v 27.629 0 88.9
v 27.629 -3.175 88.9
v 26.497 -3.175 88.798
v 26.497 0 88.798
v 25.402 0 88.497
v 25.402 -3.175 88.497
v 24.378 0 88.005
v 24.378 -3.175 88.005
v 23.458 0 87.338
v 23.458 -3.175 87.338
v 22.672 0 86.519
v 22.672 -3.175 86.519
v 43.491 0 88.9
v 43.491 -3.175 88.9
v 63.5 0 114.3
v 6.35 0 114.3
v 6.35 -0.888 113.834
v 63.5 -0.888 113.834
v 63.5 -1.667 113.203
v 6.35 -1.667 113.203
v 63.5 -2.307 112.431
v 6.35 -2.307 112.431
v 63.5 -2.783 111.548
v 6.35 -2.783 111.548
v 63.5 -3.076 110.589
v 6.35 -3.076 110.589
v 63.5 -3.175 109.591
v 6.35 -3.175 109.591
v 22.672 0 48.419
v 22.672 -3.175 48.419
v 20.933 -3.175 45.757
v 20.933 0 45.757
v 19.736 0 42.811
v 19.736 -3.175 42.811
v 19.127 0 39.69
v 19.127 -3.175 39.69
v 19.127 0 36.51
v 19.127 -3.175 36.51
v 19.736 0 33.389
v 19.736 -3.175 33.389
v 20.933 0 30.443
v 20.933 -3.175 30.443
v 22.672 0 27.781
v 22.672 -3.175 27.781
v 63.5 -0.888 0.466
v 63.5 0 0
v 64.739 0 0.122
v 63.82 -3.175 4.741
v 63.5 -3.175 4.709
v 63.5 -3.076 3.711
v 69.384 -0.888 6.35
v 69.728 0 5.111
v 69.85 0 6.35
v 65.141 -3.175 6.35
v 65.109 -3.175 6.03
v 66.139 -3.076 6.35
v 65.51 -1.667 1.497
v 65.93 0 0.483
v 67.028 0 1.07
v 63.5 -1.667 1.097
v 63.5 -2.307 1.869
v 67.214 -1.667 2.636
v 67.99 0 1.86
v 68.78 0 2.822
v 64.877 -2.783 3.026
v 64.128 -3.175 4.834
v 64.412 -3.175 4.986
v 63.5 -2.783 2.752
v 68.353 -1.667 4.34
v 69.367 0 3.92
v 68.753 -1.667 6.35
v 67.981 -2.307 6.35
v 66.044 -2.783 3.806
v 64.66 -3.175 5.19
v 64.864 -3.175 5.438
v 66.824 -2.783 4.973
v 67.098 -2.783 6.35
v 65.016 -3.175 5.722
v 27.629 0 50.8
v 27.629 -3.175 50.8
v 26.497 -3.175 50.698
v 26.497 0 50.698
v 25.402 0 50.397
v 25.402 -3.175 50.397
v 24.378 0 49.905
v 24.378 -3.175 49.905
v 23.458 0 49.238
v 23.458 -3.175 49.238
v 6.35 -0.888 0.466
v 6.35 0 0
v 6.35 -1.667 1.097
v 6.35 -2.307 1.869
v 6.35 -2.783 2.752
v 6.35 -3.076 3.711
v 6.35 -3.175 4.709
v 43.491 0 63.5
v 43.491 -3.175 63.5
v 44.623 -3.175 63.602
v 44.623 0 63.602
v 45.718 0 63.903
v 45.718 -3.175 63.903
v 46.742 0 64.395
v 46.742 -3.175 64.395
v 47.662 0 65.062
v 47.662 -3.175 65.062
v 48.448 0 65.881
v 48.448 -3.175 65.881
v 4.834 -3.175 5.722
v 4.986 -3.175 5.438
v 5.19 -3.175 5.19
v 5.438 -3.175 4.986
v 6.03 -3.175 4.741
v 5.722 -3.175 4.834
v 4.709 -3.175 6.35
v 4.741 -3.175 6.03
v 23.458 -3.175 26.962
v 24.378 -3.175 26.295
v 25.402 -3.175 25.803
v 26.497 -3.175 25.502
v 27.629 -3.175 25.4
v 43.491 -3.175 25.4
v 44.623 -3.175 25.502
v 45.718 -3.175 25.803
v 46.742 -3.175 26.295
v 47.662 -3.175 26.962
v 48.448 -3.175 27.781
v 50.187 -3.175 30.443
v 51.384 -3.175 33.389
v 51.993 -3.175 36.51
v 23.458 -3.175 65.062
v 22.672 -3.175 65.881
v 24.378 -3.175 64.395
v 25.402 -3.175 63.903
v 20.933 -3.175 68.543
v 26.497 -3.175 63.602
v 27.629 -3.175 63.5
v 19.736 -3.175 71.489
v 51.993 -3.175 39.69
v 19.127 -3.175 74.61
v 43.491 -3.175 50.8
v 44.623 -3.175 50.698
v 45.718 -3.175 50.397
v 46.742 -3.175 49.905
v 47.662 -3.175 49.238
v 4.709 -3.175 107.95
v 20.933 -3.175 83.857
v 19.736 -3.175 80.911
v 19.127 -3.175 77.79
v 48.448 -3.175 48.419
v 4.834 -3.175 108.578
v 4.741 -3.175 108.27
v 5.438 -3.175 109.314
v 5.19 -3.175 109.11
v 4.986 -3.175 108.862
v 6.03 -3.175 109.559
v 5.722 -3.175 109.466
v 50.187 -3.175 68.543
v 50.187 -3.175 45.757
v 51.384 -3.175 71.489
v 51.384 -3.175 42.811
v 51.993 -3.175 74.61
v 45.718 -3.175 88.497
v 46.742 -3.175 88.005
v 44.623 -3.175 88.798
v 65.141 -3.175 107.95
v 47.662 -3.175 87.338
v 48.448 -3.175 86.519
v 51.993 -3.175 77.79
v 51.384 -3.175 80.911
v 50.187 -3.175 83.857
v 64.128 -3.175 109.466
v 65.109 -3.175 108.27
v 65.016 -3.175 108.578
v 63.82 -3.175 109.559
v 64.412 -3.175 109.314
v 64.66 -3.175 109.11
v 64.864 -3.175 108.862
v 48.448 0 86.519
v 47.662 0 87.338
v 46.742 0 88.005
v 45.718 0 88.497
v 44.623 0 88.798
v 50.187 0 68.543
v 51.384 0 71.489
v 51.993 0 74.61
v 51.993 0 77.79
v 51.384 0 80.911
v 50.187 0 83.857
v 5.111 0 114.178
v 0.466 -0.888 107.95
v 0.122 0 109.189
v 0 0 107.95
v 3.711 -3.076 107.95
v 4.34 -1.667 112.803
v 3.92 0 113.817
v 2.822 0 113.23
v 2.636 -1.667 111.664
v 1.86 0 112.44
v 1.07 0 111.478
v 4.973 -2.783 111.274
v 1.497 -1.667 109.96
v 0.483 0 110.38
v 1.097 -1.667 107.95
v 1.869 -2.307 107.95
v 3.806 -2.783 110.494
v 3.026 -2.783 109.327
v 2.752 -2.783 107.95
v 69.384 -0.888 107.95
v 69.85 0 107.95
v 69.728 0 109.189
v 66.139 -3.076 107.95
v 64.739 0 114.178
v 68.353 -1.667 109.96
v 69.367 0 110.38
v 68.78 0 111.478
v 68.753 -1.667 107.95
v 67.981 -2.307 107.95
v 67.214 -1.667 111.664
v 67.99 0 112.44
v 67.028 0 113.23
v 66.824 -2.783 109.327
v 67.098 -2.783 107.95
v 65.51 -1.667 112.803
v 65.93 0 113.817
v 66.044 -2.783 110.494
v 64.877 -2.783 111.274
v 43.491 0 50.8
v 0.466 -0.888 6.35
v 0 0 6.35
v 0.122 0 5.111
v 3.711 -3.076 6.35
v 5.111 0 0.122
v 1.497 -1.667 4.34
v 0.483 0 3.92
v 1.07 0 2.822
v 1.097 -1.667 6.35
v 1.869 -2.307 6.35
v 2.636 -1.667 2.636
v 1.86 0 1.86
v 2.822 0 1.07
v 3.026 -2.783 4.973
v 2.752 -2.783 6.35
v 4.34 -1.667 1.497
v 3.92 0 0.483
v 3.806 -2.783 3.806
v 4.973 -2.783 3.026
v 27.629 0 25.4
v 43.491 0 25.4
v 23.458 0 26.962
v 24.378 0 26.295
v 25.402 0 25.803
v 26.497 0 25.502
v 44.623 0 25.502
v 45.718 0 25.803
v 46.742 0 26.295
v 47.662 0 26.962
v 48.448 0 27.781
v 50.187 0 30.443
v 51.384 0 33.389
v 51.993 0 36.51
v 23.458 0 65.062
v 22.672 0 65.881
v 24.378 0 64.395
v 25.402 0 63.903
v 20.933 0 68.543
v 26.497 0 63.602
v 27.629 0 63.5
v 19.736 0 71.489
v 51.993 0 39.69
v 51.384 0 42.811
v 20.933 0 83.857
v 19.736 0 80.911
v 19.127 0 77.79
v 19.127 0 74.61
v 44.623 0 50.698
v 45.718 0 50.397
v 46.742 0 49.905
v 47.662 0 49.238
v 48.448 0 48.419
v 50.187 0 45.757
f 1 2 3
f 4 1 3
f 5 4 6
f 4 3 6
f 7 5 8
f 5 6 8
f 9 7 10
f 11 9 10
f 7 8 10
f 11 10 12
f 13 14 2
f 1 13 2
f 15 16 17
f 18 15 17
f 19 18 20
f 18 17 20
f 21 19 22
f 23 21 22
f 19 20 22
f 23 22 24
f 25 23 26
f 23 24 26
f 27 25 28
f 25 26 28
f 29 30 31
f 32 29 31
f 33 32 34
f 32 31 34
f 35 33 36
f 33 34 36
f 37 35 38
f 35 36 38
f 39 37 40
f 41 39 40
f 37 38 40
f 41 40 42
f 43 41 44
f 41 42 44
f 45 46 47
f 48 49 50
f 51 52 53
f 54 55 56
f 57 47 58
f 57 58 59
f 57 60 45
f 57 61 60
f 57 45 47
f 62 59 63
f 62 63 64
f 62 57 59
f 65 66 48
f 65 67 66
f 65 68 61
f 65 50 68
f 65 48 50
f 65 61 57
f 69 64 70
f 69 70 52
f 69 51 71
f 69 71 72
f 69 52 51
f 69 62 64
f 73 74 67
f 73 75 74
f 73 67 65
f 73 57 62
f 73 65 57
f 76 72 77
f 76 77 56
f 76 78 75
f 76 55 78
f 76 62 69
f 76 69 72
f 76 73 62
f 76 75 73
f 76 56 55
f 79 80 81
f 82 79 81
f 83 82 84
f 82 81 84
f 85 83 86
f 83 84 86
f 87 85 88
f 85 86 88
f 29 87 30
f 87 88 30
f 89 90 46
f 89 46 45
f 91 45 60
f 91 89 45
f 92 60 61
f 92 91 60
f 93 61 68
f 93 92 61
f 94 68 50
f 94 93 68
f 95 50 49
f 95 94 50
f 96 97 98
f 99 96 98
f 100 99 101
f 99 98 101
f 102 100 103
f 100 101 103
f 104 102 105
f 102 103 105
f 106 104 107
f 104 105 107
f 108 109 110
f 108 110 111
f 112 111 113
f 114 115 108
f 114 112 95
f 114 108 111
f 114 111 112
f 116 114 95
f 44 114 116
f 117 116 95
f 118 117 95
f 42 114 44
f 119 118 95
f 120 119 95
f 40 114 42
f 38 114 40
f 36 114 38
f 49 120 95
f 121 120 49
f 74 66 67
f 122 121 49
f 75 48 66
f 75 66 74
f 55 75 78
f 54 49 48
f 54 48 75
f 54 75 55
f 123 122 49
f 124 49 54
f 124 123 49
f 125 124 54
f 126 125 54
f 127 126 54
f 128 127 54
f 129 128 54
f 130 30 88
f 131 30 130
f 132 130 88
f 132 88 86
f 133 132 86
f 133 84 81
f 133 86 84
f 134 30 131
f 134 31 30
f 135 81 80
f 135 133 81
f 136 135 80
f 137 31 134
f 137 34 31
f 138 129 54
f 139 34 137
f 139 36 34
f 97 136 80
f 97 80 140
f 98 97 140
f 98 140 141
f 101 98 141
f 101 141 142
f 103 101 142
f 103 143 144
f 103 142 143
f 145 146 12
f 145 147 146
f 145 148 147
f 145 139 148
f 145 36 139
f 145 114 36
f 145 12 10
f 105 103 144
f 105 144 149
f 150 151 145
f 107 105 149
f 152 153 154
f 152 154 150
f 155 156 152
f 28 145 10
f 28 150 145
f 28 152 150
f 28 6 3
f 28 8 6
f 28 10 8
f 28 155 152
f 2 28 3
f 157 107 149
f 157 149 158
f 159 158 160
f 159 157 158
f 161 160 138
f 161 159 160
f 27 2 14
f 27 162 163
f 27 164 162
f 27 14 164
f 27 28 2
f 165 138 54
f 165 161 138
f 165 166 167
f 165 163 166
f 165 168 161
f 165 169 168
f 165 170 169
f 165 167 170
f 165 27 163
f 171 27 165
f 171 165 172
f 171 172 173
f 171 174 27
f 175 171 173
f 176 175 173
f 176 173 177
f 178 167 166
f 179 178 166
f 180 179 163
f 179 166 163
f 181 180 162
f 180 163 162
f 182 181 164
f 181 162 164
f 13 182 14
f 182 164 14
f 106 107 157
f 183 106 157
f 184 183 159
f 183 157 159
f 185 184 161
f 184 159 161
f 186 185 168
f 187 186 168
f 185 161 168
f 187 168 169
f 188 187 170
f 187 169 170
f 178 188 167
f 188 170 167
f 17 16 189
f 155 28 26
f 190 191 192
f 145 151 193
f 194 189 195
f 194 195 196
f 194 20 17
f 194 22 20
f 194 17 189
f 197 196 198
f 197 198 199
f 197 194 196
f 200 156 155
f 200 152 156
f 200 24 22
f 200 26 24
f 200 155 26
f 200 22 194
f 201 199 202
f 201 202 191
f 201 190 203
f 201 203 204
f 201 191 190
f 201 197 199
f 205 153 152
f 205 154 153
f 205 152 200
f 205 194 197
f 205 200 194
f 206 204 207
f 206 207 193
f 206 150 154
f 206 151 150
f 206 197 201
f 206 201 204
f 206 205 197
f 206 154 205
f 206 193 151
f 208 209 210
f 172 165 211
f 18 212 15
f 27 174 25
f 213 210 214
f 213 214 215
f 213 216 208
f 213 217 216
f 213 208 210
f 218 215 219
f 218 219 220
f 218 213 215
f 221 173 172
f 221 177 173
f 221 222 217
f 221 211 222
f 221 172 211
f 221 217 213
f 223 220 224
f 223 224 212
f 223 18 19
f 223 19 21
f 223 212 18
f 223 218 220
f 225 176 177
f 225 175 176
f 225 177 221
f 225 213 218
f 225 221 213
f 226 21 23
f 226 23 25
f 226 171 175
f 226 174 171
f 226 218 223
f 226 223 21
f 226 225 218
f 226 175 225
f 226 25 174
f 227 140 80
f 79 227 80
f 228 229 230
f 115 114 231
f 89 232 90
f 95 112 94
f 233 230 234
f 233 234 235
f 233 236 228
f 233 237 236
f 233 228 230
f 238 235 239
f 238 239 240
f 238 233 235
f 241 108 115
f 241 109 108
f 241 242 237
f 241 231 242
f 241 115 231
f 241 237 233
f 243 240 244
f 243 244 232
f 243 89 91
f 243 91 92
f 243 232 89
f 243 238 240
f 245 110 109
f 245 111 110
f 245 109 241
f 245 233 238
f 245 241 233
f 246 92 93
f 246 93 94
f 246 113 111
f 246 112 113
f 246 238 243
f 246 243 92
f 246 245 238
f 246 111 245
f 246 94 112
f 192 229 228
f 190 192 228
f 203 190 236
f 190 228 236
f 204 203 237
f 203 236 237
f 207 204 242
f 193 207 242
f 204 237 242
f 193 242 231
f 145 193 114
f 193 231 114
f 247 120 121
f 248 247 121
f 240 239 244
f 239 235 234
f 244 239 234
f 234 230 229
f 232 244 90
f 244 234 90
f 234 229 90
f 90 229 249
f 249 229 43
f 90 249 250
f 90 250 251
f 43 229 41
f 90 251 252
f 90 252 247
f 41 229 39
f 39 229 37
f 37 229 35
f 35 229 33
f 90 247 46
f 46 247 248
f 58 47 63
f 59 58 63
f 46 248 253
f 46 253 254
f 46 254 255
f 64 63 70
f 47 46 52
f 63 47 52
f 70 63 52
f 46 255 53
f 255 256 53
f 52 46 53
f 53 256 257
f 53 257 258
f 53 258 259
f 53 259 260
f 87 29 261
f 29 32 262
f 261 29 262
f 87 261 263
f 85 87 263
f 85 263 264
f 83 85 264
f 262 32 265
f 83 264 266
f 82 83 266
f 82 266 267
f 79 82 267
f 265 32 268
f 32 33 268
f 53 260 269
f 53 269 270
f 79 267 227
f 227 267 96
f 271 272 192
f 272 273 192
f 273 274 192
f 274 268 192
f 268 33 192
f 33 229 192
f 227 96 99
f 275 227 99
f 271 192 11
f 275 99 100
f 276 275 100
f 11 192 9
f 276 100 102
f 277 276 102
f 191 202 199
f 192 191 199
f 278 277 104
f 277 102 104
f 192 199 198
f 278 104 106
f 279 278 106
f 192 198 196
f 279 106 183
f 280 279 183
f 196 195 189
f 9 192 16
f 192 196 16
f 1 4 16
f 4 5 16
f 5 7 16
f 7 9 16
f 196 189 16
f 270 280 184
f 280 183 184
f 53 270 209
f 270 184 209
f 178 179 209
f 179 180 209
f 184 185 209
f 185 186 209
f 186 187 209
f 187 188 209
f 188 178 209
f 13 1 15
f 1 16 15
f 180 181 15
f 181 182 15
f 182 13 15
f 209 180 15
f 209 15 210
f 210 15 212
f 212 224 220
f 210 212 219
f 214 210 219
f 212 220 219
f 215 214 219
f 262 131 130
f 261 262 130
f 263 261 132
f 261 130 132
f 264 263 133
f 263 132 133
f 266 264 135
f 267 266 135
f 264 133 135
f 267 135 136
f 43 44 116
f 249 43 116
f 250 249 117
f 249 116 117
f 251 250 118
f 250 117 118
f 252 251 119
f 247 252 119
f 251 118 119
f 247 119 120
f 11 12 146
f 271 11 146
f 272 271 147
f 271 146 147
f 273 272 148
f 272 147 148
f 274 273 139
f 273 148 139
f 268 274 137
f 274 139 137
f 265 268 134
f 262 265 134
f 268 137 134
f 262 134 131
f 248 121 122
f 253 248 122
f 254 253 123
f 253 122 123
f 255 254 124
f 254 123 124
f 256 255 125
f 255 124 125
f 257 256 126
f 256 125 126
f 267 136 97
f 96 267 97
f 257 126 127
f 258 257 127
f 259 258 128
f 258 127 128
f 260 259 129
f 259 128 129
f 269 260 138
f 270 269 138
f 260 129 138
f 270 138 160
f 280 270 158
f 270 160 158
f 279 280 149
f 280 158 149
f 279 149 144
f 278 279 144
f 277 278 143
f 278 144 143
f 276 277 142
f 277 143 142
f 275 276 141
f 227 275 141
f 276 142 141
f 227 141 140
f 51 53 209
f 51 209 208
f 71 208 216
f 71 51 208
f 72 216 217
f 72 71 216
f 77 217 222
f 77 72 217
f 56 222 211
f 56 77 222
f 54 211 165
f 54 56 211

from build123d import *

# Parameters (mm, degrees)
F1_DEPTH     = 3.175
F2_T1_DEPTH  = 57.15
F2_T3_DEPTH  = 101.6
F2_T6_ANGLE  = 90
F2_T8_ANGLE  = 90
F2_T10_ANGLE = 90
F2_T12_ANGLE = 90
F4_DEPTH     = 25.4


# Not quite as in the source:
# - a fillet or chamfer that OpenCascade refuses, or shapes differently, is made with other operations: its cross-section is extruded or revolved along the edge and cut away or added


with BuildPart() as f1:
    # F0 (on Front) → F1 (new body)
    with BuildSketch(Plane.XZ):
        with BuildLine():
            ThreePointArc((0, 6.35), (1.8598719395, 1.8598719395), (6.35, 0))
            Line((6.35, 0), (63.5, 0))
            ThreePointArc((63.5, 0), (67.9901280605, 1.8598719395), (69.85, 6.35))
            Line((69.85, 6.35), (69.85, 107.95))
            ThreePointArc((69.85, 107.95), (67.9901280605, 112.4401280605), (63.5, 114.3))
            Line((63.5, 114.3), (6.35, 114.3))
            ThreePointArc((6.35, 114.3), (1.8598719395, 112.4401280605), (0, 107.95))
            Line((0, 107.95), (0, 6.35))
        make_face()
    extrude(amount=F1_DEPTH)

    # F2: fillet of radius 5.08 on 1 edges, made by hand

    # F2_s2 → F2_t1 (cut)
    with BuildSketch(Plane.YZ.offset(6.35)):
        with BuildLine():
            ThreePointArc((0, 114.3), (-2.3071134838, 112.4305202921), (-3.175, 109.5907139607))
            Line((-3.175, 109.5907139607), (-3.175, 114.3))
            Line((-3.175, 114.3), (0, 114.3))
        make_face()
        with BuildLine():
            ThreePointArc((0, 0), (-2.3071134838, 1.8694797079), (-3.175, 4.7092860393))
            Line((-3.175, 4.7092860393), (-3.175, 0))
            Line((-3.175, 0), (0, 0))
        make_face()
    extrude(amount=F2_T1_DEPTH, mode=Mode.SUBTRACT)

    # F2_s4 → F2_t3 (cut)
    with BuildSketch(Plane.XY.offset(6.35)):
        with BuildLine():
            ThreePointArc((0, 0), (1.8694797079, -2.3071134838), (4.7092860393, -3.175))
            Line((4.7092860393, -3.175), (0, -3.175))
            Line((0, -3.175), (0, 0))
        make_face()
        with BuildLine():
            ThreePointArc((69.85, 0), (67.9805202921, -2.3071134838), (65.1407139607, -3.175))
            Line((65.1407139607, -3.175), (69.85, -3.175))
            Line((69.85, -3.175), (69.85, 0))
        make_face()
    extrude(amount=F2_T3_DEPTH, mode=Mode.SUBTRACT)

    # F2_s5 → F2_t6 (revolve, cut)
    with BuildSketch(Plane.XY.offset(107.95)):
        with BuildLine():
            ThreePointArc((69.85, 0), (67.9805202921, -2.3071134838), (65.1407139607, -3.175))
            Line((65.1407139607, -3.175), (69.85, -3.175))
            Line((69.85, -3.175), (69.85, 0))
        make_face()
    revolve(axis=Axis((63.5, -3.175, 107.95), (0, -1, 0)), revolution_arc=F2_T6_ANGLE, mode=Mode.SUBTRACT)

    # F2_s7 → F2_t8 (revolve, cut)
    with BuildSketch(Plane.YZ.offset(6.35)):
        with BuildLine():
            ThreePointArc((0, 114.3), (-2.3071134838, 112.4305202921), (-3.175, 109.5907139607))
            Line((-3.175, 109.5907139607), (-3.175, 114.3))
            Line((-3.175, 114.3), (0, 114.3))
        make_face()
    revolve(axis=Axis((6.35, -3.175, 107.95), (0, -1, 0)), revolution_arc=F2_T8_ANGLE, mode=Mode.SUBTRACT)

    # F2_s9 → F2_t10 (revolve, cut)
    with BuildSketch(Plane.XY.offset(6.35)):
        with BuildLine():
            ThreePointArc((0, 0), (1.8694797079, -2.3071134838), (4.7092860393, -3.175))
            Line((4.7092860393, -3.175), (0, -3.175))
            Line((0, -3.175), (0, 0))
        make_face()
    revolve(axis=Axis((6.35, -3.175, 6.35), (0, -1, 0)), revolution_arc=F2_T10_ANGLE, mode=Mode.SUBTRACT)

    # F2_s11 → F2_t12 (revolve, cut)
    with BuildSketch(Plane.YZ.offset(63.5)):
        with BuildLine():
            ThreePointArc((0, 0), (-2.3071134838, 1.8694797079), (-3.175, 4.7092860393))
            Line((-3.175, 4.7092860393), (-3.175, 0))
            Line((-3.175, 0), (0, 0))
        make_face()
    revolve(axis=Axis((63.5, -3.175, 6.35), (0, -1, 0)), revolution_arc=F2_T12_ANGLE, mode=Mode.SUBTRACT)

    # F3 (on face) → F4 (cut)
    with BuildSketch(Plane.XZ.offset(3.175)):
        with BuildLine():
            ThreePointArc((27.628852542, 88.9), (24.879221885, 88.2738126498), (22.6718853808, 86.51875))
            ThreePointArc((22.6718853808, 86.51875), (19.05, 76.2), (22.6718853808, 65.88125))
            ThreePointArc((22.6718853808, 65.88125), (24.879221885, 64.1261873502), (27.628852542, 63.5))
            Line((27.628852542, 63.5), (43.491147458, 63.5))
            ThreePointArc((43.491147458, 63.5), (46.240778115, 64.1261873502), (48.4481146192, 65.88125))
            ThreePointArc((48.4481146192, 65.88125), (52.07, 76.2), (48.4481146192, 86.51875))
            ThreePointArc((48.4481146192, 86.51875), (46.240778115, 88.2738126498), (43.491147458, 88.9))
            Line((43.491147458, 88.9), (27.628852542, 88.9))
        make_face()
        with BuildLine():
            ThreePointArc((22.6718853808, 27.78125), (24.879221885, 26.0261873502), (27.628852542, 25.4))
            Line((27.628852542, 25.4), (43.491147458, 25.4))
            ThreePointArc((43.491147458, 25.4), (46.240778115, 26.0261873502), (48.4481146192, 27.78125))
            ThreePointArc((48.4481146192, 27.78125), (52.07, 38.1), (48.4481146192, 48.41875))
            ThreePointArc((48.4481146192, 48.41875), (46.240778115, 50.1738126498), (43.491147458, 50.8))
            Line((43.491147458, 50.8), (27.628852542, 50.8))
            ThreePointArc((27.628852542, 50.8), (24.879221885, 50.1738126498), (22.6718853808, 48.41875))
            ThreePointArc((22.6718853808, 48.41875), (19.05, 38.1), (22.6718853808, 27.78125))
        make_face()
    extrude(amount=-F4_DEPTH, mode=Mode.SUBTRACT)


solid = f1.part
